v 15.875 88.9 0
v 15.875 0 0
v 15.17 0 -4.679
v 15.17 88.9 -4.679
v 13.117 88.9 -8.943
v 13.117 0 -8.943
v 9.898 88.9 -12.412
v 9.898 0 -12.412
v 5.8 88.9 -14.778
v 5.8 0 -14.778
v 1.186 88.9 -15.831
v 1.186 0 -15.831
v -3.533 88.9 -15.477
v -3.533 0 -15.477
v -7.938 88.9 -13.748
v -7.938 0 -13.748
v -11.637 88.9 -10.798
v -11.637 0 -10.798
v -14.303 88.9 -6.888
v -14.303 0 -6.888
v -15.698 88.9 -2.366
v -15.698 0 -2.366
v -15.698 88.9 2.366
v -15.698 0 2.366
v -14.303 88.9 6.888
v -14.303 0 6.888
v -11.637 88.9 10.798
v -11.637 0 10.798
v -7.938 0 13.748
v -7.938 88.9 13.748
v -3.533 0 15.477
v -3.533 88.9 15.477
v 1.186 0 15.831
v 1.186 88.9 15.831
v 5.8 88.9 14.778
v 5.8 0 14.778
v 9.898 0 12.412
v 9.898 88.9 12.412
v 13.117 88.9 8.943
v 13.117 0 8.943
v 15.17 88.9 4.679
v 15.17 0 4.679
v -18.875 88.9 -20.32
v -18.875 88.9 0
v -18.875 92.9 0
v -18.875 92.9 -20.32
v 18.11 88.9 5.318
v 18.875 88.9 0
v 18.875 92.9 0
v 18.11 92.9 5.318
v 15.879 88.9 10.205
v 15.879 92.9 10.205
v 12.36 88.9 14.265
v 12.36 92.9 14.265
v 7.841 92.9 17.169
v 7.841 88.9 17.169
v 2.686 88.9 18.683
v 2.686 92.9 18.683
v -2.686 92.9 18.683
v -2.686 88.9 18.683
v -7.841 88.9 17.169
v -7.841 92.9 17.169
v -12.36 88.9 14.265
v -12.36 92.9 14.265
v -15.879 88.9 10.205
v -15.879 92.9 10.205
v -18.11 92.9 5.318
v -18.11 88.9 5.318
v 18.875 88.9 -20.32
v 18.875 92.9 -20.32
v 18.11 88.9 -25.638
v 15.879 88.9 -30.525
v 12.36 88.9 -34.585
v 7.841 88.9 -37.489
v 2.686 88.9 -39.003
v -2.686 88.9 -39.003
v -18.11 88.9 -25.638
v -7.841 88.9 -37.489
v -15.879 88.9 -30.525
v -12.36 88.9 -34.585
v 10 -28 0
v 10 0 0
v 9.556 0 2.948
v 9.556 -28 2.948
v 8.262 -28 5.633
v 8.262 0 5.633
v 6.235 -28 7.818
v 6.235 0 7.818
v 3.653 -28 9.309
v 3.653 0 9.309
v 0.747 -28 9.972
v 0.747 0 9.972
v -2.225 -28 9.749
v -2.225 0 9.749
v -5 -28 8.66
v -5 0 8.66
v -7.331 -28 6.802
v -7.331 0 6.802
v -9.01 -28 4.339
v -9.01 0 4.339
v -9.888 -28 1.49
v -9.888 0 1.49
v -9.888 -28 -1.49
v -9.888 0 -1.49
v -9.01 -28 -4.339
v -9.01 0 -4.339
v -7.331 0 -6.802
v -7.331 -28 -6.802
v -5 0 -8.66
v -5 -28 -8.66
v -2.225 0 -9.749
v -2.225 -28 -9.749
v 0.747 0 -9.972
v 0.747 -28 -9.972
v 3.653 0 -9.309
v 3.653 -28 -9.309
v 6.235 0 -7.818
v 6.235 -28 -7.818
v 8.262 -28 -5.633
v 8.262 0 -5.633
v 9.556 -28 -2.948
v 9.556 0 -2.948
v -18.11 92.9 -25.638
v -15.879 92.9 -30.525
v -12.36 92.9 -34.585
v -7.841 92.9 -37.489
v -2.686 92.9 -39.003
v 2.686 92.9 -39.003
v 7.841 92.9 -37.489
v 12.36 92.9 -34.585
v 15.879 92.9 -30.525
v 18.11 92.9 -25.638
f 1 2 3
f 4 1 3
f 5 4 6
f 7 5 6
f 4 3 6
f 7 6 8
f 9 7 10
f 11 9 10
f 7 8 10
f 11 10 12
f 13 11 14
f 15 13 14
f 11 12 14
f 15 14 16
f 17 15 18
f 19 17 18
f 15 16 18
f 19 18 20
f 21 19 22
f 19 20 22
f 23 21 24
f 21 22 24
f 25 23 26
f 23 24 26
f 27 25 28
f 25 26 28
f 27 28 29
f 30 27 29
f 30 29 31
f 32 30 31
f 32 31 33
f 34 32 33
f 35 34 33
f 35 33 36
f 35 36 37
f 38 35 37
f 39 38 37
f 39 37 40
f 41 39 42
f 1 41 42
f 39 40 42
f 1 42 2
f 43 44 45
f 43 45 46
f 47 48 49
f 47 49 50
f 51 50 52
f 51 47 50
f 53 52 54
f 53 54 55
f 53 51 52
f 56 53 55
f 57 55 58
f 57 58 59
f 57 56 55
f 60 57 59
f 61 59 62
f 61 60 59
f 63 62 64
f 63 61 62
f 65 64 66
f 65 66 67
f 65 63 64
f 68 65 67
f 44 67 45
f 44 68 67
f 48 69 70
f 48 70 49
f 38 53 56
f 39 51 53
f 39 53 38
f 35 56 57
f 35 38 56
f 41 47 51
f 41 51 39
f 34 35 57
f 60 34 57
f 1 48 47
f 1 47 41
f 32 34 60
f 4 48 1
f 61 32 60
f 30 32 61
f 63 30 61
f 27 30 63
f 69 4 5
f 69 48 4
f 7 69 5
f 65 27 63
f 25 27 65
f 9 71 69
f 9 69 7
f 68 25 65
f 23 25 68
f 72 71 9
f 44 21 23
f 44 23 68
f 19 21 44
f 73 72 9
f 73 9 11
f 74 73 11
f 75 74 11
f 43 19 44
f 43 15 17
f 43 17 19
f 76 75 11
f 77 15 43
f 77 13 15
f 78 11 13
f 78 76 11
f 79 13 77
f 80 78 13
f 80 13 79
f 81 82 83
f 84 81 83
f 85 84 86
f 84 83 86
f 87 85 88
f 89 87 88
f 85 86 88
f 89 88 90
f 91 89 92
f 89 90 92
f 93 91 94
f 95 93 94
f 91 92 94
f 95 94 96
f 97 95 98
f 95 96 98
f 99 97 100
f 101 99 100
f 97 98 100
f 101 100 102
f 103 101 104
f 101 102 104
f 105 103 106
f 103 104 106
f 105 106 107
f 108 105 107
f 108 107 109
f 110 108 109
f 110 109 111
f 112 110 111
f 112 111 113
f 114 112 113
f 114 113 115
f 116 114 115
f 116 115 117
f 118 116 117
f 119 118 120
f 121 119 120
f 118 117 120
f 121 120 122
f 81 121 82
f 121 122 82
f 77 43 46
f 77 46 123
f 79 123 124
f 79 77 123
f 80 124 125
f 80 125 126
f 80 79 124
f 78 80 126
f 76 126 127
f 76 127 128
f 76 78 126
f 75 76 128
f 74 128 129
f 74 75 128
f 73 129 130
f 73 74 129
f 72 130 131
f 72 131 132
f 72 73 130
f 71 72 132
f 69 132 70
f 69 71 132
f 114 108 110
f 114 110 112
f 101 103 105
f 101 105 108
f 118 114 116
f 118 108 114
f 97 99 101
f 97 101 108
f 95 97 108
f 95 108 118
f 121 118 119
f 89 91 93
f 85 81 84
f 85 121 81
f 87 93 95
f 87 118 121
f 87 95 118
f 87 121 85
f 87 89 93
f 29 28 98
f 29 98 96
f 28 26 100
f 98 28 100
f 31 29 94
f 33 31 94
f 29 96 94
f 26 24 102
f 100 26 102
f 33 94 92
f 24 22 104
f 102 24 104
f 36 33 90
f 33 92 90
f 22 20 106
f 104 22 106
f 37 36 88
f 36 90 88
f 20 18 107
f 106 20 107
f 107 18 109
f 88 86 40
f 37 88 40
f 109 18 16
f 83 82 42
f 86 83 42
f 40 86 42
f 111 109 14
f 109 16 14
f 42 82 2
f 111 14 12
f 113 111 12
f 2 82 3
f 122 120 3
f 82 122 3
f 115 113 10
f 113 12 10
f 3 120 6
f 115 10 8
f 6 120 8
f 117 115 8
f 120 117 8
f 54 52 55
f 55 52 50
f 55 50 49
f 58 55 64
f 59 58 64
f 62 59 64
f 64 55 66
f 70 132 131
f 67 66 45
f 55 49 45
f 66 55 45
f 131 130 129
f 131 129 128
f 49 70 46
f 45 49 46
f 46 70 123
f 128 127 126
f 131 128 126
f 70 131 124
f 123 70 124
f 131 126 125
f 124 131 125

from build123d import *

# Parameters (mm, degrees)
SKETCH1_R           = 15.875
BOSS_EXTRUDE1_DEPTH = 88.9
BOSS_EXTRUDE2_DEPTH = 4
SKETCH3_R           = 9.999999939
BOSS_EXTRUDE3_DEPTH = 27.99999991


with BuildPart() as part:
    # Sketch1 → Boss-Extrude1 (new body)
    with BuildSketch(Plane(origin=(0, 0, 0), x_dir=(1, 0, 0), z_dir=(0, 1, 0))):
        Circle(SKETCH1_R)
    extrude(amount=BOSS_EXTRUDE1_DEPTH)

    # Sketch2 → Boss-Extrude2 (add)
    with BuildSketch(Plane(origin=(0, 88.9, 0), x_dir=(1, 0, 0), z_dir=(0, 1, 0))):
        with BuildLine():
            Line((-18.875, 0), (-18.875, 20.32))
            ThreePointArc((-18.875, 20.32), (0, 39.195), (18.875, 20.32))
            Line((18.875, 20.32), (18.875, 0))
            ThreePointArc((18.875, 0), (0, -18.875), (-18.875, 0))
        make_face()
    extrude(amount=BOSS_EXTRUDE2_DEPTH)

    # Sketch3 → Boss-Extrude3 (add)
    with BuildSketch(Plane.XZ):
        Circle(SKETCH3_R)
    extrude(amount=BOSS_EXTRUDE3_DEPTH)


solid = part.part
